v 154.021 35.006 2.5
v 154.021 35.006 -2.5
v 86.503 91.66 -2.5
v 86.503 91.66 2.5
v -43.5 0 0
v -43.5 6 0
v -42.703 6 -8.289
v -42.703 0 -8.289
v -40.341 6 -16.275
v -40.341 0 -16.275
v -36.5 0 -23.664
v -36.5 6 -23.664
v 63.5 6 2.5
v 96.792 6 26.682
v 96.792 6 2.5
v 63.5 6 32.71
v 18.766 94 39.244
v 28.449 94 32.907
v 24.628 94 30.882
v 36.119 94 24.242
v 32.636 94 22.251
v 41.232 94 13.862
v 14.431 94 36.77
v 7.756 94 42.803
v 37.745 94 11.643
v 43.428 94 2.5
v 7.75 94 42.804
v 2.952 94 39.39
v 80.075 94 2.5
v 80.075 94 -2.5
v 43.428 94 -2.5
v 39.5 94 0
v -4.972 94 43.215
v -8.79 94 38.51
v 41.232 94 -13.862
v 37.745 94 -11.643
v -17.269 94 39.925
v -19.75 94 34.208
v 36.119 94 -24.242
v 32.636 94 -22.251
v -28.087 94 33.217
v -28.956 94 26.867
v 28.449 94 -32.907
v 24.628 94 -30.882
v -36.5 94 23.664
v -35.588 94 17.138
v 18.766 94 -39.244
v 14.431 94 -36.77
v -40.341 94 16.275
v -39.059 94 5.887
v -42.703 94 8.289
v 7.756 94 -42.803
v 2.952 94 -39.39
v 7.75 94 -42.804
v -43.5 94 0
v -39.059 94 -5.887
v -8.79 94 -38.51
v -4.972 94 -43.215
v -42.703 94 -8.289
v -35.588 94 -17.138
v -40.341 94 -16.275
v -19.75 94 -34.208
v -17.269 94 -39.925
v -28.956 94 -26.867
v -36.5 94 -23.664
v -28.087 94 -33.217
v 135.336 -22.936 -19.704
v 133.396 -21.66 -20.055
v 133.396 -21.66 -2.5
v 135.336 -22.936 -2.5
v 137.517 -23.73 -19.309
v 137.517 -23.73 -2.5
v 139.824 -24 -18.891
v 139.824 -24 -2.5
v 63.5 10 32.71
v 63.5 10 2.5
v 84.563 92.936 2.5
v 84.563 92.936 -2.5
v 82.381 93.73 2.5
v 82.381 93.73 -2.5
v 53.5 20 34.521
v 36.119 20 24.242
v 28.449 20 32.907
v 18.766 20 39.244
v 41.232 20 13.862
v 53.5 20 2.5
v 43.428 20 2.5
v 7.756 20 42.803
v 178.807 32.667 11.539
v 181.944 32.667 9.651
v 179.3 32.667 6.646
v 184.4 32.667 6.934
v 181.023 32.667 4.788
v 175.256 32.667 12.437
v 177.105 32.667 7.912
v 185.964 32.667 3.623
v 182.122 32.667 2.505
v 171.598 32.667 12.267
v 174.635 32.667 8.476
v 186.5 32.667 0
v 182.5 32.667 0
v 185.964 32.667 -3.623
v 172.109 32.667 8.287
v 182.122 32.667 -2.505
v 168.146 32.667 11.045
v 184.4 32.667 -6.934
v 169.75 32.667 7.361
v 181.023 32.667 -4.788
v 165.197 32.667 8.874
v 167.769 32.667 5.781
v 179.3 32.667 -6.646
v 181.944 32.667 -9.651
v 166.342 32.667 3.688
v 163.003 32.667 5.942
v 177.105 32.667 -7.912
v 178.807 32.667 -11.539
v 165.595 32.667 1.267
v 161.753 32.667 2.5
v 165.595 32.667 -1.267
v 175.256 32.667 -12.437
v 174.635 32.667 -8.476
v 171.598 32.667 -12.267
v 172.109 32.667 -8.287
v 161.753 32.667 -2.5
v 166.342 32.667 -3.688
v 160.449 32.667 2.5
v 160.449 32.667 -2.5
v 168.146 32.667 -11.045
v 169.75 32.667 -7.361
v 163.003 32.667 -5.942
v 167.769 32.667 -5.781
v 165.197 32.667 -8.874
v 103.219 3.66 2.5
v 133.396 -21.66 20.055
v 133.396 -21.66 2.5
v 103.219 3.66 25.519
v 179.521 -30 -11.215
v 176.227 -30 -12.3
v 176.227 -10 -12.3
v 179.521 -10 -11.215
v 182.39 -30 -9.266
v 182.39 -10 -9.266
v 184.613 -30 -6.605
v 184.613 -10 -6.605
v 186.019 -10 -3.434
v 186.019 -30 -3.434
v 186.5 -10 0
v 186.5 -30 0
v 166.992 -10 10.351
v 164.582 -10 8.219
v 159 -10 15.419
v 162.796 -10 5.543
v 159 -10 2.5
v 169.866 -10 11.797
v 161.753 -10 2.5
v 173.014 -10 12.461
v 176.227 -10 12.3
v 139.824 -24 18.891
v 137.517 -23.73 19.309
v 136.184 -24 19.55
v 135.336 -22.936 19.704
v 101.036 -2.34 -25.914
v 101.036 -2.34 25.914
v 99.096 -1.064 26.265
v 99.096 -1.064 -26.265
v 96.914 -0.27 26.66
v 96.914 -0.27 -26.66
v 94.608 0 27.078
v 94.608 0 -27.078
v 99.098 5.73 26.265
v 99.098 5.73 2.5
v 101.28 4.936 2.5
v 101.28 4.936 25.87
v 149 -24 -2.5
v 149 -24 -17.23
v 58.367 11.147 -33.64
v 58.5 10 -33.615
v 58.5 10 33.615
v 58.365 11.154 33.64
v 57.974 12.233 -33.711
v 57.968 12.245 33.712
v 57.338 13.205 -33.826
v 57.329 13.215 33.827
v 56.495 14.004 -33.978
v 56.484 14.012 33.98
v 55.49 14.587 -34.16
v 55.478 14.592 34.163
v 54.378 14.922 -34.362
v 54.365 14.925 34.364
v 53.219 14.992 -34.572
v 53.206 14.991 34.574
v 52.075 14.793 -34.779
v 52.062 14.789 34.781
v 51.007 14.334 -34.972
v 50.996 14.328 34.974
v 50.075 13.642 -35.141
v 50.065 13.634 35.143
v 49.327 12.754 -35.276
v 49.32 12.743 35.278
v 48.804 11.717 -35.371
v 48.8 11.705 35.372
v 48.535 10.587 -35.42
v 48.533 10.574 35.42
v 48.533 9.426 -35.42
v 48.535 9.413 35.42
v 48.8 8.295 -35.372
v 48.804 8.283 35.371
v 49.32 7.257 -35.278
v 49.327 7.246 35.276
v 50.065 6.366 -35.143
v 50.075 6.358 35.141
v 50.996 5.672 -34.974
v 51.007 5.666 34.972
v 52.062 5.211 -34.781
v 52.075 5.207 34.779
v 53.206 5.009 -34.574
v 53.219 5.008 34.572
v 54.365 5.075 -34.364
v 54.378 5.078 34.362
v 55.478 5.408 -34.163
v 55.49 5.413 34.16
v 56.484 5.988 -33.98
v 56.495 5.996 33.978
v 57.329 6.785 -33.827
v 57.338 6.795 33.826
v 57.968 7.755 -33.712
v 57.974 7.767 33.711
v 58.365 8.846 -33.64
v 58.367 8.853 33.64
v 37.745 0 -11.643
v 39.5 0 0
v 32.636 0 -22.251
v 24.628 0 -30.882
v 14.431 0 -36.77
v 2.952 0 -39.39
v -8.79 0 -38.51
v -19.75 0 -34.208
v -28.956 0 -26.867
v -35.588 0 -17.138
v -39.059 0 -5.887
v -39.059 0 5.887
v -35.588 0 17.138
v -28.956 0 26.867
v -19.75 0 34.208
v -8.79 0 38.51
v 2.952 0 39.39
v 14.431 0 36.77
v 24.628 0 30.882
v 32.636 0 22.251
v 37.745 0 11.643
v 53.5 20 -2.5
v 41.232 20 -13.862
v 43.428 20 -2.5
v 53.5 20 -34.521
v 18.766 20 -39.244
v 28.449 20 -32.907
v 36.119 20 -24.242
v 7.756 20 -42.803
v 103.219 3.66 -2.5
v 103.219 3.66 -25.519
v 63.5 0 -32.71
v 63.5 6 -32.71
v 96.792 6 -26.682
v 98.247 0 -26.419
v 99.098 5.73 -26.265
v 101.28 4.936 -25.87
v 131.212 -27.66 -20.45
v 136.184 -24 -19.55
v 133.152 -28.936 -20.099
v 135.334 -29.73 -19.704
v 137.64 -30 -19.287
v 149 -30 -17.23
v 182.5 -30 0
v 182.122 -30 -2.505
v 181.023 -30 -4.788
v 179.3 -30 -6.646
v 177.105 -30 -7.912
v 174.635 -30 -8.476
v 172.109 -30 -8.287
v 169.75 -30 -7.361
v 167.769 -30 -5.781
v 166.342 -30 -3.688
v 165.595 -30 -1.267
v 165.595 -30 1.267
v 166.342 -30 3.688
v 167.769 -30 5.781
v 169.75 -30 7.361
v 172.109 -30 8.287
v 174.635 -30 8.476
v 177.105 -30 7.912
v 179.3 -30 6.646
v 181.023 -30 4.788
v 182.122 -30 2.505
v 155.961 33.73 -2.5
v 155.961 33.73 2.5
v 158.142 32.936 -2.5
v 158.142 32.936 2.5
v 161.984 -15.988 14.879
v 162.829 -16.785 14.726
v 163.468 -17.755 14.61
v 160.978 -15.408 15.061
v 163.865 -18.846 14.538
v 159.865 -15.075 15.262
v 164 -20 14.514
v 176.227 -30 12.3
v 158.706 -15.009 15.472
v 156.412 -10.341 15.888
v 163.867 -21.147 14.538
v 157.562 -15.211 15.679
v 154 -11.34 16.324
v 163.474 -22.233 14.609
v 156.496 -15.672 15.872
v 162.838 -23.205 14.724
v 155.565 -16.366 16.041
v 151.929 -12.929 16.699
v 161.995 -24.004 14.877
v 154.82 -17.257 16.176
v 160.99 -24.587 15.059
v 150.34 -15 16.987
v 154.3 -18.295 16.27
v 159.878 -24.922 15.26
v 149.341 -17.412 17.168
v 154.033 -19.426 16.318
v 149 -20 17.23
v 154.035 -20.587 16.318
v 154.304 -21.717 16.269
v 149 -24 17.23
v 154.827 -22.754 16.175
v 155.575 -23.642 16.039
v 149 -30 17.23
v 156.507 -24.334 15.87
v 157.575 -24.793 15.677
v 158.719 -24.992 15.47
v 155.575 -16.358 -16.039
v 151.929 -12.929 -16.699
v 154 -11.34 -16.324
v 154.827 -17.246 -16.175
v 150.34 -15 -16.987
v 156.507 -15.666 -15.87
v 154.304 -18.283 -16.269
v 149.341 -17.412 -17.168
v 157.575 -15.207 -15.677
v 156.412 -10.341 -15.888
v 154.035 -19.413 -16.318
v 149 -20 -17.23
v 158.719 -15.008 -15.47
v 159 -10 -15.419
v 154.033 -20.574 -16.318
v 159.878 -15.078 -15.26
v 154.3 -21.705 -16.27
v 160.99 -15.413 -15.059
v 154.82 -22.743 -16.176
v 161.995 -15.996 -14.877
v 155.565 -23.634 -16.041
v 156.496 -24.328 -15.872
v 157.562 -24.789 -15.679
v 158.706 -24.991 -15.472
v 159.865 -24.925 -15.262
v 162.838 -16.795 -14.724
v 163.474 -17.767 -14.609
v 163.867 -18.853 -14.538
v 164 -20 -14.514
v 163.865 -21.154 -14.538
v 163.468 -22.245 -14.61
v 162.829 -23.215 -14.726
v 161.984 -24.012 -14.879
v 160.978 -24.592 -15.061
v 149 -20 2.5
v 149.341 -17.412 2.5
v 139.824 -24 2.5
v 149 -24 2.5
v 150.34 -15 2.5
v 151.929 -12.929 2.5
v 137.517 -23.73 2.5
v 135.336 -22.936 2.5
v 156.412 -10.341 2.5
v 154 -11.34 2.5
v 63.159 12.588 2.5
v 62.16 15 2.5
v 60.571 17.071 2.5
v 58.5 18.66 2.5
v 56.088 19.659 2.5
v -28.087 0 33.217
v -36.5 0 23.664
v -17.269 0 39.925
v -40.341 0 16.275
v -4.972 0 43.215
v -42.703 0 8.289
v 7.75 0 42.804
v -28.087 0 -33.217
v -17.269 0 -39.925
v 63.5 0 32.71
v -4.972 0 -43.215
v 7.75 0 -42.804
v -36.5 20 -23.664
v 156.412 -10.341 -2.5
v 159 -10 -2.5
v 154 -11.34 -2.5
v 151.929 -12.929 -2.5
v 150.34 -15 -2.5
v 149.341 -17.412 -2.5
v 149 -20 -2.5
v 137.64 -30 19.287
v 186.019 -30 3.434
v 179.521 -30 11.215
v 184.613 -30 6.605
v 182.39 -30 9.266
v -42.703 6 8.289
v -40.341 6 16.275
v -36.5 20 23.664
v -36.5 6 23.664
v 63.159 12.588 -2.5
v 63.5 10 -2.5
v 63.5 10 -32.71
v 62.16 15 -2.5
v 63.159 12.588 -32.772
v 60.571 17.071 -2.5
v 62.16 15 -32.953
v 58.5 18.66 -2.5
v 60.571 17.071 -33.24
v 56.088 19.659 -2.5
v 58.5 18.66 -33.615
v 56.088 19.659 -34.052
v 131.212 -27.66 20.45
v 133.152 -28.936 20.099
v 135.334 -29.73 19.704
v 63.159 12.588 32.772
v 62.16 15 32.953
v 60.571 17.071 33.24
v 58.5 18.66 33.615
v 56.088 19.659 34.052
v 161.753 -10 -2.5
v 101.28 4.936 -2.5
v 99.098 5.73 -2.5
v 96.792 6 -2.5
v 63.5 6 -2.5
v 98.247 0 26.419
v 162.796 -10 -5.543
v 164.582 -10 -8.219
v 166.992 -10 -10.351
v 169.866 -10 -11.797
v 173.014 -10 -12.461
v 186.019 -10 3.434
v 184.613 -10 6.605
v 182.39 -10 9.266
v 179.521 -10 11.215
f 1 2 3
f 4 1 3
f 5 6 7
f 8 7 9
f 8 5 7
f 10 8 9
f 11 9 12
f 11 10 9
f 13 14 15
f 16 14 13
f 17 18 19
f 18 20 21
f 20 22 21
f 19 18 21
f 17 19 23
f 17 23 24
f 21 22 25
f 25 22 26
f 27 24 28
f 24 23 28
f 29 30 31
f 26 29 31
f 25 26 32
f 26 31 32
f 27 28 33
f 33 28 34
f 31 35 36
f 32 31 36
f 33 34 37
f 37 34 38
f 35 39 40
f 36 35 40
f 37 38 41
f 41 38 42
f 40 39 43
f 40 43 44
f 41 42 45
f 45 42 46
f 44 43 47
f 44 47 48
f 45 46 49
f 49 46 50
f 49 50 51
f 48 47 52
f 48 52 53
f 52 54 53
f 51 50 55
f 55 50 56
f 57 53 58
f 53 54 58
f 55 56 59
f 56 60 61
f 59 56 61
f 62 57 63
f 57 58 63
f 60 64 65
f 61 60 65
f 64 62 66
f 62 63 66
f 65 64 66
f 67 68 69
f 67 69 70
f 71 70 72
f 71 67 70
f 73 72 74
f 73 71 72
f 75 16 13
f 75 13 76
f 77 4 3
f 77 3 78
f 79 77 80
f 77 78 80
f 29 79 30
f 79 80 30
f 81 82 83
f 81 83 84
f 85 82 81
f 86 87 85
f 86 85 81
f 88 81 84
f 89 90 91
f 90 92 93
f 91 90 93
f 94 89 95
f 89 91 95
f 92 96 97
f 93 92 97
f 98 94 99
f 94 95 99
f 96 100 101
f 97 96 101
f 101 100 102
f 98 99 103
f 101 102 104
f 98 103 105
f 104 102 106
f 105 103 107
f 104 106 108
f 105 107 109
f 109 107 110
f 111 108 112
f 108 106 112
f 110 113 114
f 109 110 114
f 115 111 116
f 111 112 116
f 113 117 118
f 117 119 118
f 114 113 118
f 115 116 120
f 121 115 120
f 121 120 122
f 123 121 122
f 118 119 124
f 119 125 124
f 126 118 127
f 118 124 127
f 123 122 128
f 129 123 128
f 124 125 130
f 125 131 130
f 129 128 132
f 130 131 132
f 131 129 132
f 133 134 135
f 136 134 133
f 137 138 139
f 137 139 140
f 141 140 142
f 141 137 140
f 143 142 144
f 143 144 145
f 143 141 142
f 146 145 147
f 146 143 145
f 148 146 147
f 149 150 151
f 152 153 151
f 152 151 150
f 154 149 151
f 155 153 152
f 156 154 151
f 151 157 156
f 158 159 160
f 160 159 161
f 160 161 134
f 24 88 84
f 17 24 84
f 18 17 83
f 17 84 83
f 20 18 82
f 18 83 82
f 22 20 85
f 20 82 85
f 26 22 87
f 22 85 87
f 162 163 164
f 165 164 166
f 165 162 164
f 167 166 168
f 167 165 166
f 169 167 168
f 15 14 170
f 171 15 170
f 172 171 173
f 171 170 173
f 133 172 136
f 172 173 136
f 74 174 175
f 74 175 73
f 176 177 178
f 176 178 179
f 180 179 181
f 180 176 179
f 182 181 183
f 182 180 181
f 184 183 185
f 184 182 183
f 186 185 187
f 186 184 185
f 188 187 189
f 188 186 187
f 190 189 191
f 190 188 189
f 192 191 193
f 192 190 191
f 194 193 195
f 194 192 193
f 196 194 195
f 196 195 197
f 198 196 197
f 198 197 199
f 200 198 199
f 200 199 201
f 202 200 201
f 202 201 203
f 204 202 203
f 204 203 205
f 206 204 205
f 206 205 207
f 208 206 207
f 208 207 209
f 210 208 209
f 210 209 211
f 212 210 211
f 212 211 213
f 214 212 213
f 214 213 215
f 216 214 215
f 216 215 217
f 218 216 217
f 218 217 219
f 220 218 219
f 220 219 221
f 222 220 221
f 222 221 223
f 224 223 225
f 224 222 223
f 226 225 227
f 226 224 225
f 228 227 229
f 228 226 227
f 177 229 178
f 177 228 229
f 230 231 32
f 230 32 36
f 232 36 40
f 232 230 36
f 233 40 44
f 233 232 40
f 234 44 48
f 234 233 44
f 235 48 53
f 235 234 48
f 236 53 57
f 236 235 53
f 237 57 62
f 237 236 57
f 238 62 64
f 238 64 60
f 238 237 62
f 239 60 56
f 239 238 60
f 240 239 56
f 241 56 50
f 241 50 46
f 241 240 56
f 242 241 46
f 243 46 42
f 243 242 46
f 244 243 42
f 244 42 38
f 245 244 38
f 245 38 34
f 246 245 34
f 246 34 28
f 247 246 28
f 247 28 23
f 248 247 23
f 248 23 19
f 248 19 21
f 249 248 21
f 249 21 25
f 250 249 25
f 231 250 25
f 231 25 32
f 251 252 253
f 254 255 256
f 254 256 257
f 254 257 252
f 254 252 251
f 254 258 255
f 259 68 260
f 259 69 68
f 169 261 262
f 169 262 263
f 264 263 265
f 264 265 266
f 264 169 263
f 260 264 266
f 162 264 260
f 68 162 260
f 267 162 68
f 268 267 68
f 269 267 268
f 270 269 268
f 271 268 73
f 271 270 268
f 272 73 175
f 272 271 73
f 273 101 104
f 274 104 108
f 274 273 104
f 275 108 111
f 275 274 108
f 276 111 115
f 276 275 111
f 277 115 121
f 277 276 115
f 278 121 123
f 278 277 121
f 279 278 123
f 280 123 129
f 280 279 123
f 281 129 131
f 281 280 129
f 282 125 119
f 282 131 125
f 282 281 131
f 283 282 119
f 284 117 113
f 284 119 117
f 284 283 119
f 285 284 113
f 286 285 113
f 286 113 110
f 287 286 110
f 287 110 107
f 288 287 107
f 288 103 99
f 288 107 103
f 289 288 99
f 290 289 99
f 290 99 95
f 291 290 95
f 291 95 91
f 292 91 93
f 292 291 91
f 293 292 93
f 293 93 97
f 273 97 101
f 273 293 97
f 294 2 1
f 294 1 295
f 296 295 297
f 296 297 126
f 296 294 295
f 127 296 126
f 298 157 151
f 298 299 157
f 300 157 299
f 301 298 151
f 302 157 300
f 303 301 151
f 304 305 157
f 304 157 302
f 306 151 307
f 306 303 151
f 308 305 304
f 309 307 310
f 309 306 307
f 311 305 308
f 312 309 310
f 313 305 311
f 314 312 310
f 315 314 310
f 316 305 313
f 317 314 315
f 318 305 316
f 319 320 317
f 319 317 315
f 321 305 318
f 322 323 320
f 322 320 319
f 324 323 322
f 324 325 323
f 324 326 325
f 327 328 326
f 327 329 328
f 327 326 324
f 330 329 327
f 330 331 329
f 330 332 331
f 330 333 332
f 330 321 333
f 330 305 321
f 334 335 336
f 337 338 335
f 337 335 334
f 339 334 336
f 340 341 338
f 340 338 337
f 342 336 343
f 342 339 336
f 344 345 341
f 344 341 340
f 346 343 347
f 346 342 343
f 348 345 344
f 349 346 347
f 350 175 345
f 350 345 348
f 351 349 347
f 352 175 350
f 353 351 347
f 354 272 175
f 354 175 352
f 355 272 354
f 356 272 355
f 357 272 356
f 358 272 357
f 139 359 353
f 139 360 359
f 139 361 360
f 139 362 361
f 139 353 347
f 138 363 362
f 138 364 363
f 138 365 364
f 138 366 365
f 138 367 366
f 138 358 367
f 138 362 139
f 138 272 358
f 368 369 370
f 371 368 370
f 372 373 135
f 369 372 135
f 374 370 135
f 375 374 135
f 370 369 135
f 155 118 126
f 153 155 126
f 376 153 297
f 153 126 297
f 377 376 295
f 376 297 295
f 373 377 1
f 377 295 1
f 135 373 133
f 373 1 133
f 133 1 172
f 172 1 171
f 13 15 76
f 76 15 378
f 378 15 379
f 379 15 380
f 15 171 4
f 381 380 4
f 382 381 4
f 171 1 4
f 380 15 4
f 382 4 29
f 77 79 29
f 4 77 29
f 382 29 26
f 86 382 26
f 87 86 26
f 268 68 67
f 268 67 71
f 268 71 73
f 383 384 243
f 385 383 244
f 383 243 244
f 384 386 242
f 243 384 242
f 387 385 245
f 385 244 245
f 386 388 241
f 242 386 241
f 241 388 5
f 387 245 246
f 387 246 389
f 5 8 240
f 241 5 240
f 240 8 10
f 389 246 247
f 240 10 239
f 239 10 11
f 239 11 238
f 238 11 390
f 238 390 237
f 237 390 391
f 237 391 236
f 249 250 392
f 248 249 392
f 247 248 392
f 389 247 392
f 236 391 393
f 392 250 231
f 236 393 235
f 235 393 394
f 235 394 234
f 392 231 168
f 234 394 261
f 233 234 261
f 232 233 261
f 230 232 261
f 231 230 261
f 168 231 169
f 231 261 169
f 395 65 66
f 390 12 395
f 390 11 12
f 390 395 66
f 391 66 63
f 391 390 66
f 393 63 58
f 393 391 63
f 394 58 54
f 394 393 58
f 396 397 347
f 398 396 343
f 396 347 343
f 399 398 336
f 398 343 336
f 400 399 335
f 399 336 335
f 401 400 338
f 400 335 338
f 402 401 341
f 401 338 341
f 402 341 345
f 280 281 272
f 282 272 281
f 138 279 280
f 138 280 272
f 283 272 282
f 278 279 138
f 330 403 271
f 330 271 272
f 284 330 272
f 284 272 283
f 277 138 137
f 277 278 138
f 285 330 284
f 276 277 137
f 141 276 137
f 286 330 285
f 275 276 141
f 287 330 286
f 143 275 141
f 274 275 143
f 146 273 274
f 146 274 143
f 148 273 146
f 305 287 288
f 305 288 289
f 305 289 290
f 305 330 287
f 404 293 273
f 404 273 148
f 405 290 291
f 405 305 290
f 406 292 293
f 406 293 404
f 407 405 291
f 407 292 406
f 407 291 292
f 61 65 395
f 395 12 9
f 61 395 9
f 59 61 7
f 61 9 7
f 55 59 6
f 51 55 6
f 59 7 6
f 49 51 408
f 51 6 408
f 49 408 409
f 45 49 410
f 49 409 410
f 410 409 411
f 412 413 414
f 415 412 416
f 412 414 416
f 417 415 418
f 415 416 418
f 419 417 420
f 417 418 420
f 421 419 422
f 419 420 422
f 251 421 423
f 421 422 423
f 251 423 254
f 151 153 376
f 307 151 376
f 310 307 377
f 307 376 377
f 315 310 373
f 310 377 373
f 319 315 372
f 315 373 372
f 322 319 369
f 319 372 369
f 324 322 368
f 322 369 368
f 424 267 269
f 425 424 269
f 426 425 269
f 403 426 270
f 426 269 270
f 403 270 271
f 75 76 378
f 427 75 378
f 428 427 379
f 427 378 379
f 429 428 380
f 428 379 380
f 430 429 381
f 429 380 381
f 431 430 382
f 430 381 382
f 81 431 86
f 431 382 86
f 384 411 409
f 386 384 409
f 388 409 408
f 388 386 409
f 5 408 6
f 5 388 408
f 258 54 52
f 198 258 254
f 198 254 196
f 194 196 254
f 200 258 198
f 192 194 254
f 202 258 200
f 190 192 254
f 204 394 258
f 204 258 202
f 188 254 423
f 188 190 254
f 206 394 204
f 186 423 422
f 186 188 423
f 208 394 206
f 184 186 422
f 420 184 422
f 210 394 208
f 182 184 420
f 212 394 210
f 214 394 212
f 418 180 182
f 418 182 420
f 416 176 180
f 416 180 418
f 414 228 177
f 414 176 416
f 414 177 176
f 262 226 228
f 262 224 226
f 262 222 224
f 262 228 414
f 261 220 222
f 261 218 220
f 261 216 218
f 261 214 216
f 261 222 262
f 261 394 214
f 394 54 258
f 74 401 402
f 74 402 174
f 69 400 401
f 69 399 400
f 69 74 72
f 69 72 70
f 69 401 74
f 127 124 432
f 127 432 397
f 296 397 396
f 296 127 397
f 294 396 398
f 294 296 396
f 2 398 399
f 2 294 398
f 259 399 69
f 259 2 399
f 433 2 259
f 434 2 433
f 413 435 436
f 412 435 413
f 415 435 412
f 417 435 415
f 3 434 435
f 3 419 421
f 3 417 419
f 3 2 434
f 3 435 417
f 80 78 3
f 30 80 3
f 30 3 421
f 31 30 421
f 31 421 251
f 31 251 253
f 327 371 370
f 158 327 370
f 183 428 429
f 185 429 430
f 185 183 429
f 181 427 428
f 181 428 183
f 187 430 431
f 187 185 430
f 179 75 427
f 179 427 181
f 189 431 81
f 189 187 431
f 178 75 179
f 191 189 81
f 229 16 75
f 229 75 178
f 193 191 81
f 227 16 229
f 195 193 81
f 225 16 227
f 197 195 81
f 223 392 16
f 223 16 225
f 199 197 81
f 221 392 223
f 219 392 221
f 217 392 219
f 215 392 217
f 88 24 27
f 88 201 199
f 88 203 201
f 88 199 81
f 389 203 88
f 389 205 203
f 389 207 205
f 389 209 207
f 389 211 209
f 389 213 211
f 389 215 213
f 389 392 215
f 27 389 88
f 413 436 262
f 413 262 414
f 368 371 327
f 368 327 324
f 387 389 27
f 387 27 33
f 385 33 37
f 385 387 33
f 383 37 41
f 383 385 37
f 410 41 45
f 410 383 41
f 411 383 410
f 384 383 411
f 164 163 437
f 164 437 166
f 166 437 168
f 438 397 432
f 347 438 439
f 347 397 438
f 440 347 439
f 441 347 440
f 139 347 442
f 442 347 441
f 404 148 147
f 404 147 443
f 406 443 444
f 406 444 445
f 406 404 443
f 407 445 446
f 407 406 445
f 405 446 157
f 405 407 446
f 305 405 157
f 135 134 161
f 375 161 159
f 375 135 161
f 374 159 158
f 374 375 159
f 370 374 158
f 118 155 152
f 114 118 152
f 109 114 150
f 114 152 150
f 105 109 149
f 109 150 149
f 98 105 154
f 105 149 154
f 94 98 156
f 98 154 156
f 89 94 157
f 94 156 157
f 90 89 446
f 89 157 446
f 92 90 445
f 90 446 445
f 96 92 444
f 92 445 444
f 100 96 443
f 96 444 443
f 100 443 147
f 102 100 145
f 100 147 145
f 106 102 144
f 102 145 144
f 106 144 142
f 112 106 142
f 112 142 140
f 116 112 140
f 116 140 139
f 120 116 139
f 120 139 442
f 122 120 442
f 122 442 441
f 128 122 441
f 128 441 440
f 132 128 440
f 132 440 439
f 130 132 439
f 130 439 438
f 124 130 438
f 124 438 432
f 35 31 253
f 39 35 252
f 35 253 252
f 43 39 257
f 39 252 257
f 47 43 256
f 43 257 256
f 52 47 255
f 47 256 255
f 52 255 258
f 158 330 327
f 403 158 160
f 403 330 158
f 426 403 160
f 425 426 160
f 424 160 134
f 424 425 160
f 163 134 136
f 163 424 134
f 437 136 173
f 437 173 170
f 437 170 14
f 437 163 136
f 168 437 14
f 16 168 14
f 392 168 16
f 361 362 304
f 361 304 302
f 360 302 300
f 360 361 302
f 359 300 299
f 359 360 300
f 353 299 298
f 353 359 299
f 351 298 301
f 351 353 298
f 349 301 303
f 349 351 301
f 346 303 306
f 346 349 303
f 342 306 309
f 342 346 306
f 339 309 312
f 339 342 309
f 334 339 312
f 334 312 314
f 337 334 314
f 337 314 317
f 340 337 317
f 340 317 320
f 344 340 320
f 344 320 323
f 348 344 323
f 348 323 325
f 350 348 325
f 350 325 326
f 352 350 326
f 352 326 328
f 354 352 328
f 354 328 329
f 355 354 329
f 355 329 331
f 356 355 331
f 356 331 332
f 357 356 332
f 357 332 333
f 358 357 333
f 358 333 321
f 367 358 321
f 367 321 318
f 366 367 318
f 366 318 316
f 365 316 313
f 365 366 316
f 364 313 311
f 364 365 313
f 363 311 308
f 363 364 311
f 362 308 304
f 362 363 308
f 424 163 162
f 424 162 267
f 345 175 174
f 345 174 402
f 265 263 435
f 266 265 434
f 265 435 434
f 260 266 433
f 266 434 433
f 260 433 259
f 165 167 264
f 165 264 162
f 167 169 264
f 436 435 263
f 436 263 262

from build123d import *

# Parameters (mm, degrees)
SKETCH2_R                = 43.5
BOSS_EXTRUDE1_DEPTH      = 94
BOSS_EXTRUDE2_START      = -30
SKETCH2_3_R              = 12.5
BOSS_EXTRUDE2_DEPTH      = 62.666667
EXTRUDE_THIN1_DEPTH      = 115
BOSS_EXTRUDE3_START      = -230
SKETCH5_W                = 100
SKETCH5_H                = 20
SKETCH5_W_2              = 50
BOSS_EXTRUDE3_DEPTH      = 230
CUT_EXTRUDE2_DEPTH       = 319.334729
CUT_EXTRUDE2_DEPTH_BACK  = 319.334729
SKETCH5_3_R              = 5
CUT_EXTRUDE1_START       = -30
CUT_EXTRUDE1_OUTLINE_R   = 8.5
CUT_EXTRUDE1_OUTLINE_R_2 = 39.5
CUT_EXTRUDE1_DEPTH       = 124
RIB1_START               = -2.5
RIB1_DEPTH               = 5
FILLET1_R                = 10


# Read off the part's stored shape, not the designer's step: Cut-Extrude1, Rib1
with BuildPart() as part:
    # Sketch2 → Boss-Extrude1 (new body)
    with BuildSketch(Plane(origin=(0, 0, 0), x_dir=(1, 0, 0), z_dir=(0, 1, 0))):
        with Locations(Location((0, 0, 0), (0, 0, 270))):
            Circle(SKETCH2_R)
    extrude(amount=BOSS_EXTRUDE1_DEPTH)



with BuildPart() as body_2:
    # Sketch2<3> → Boss-Extrude2 (new body)
    with BuildSketch(Plane(origin=(0, 0, 0), x_dir=(1, 0, 0), z_dir=(0, 1, 0)).offset(BOSS_EXTRUDE2_START)):
        with Locations(Location((174, 0, 0), (0, 0, 270))):
            Circle(SKETCH2_3_R)
    extrude(amount=BOSS_EXTRUDE2_DEPTH)


with BuildPart() as part_1:
    add(part.part)

    add(body_2.part)  # Extrude-Thin1 merges body 2
    # Sketch3 → Extrude-Thin1 (add, symmetric)
    with BuildSketch(Plane.XY):
        Polygon((-43.5, 0), (98.247392, 0), (134, -30), (186.5, -30), (186.5, -24), (136.183821, -24), (100.431214, 6), (-43.5, 6), align=None)
    extrude(amount=EXTRUDE_THIN1_DEPTH, both=True)

    # Sketch5 → Boss-Extrude3 (add)
    with BuildSketch(Plane.XY.offset(115).offset(BOSS_EXTRUDE3_START)):
        with Locations((13.5, 10)):
            Rectangle(SKETCH5_W, SKETCH5_H)
        with Locations((174, -20)):
            Rectangle(SKETCH5_W_2, SKETCH5_H)
    extrude(amount=BOSS_EXTRUDE3_DEPTH)

    # Sketch5<3> → Cut-Extrude2 (cut, two sides: drawn at the far end of the back side and taken through both)
    with BuildSketch(Plane.XY.offset(115).offset(-CUT_EXTRUDE2_DEPTH_BACK)):
        with Locations((53.5, 10)):
            Circle(SKETCH5_3_R)
        with Locations((159, -20)):
            Circle(SKETCH5_3_R)
    extrude(amount=CUT_EXTRUDE2_DEPTH + CUT_EXTRUDE2_DEPTH_BACK, mode=Mode.SUBTRACT)

    # Cut-Extrude1 outline → Cut-Extrude1 (cut)
    with BuildSketch(Plane(origin=(0, 0, 0), x_dir=(1, 0, 0), z_dir=(0, 1, 0)).offset(CUT_EXTRUDE1_START)):
        with Locations((174, 0)):
            Circle(CUT_EXTRUDE1_OUTLINE_R)
        with BuildLine():
            ThreePointArc((-36.5, 23.664319), (-17.269135, 39.925267), (7.75, 42.804059))
            Line((7.75, 42.804059), (63.5, 32.710099))
            Line((63.5, 32.710099), (63.5, 115))
            Line((63.5, 115), (-36.5, 115))
            Line((-36.5, 115), (-36.5, 23.664319))
        make_face()
        with BuildLine():
            Line((63.5, -32.710099), (7.75, -42.804059))
            ThreePointArc((7.75, -42.804059), (-17.269135, -39.925267), (-36.5, -23.664319))
            Line((-36.5, -23.664319), (-36.5, -115))
            Line((-36.5, -115), (63.5, -115))
            Line((63.5, -115), (63.5, -32.710099))
        make_face()
        with BuildLine():
            ThreePointArc((-43.5, 0), (-41.713307, 12.338963), (-36.5, 23.664319))
            Line((-36.5, 23.664319), (-36.5, 115))
            Line((-36.5, 115), (-43.5, 115))
            Line((-43.5, 115), (-43.5, 0))
        make_face()
        Polygon((63.5, 115), (63.5, 32.710099), (149, 17.229674), (149, 115), align=None)
        with BuildLine():
            Line((-36.5, -115), (-36.5, -23.664319))
            ThreePointArc((-36.5, -23.664319), (-41.713307, -12.338963), (-43.5, 0))
            Line((-43.5, 0), (-43.5, -115))
            Line((-43.5, -115), (-36.5, -115))
        make_face()
        Polygon((149, -17.229674), (63.5, -32.710099), (63.5, -115), (149, -115), align=None)
        with BuildLine():
            Line((149, 115), (149, 17.229674))
            Line((149, 17.229674), (176.227011, 12.300017))
            ThreePointArc((176.227011, 12.300017), (183.593947, 8.012876), (186.5, 0))
            ThreePointArc((186.5, 0), (183.593947, -8.012876), (176.227011, -12.300017))
            Line((176.227011, -12.300017), (149, -17.229674))
            Line((149, -17.229674), (149, -115))
            Line((149, -115), (199, -115))
            Line((199, -115), (199, 115))
            Line((199, 115), (149, 115))
        make_face()
        Circle(CUT_EXTRUDE1_OUTLINE_R_2)
    extrude(amount=CUT_EXTRUDE1_DEPTH, mode=Mode.SUBTRACT)

    # Rib1 outline → Rib1 (add)
    with BuildSketch(Plane.XY.offset(RIB1_START)):
        Polygon((156.808801, 32.666667), (83.714581, 94), (42, 94), (42, 20), (63.5, 20), (63.5, 6), (100.431214, 6), (136.183821, -24), (149, -24), (149, -10), (163, -10), (163, 32.666667), align=None)
    extrude(amount=RIB1_DEPTH)

    # Fillet1
    # the kernel refuses this fillet: 10 mm, written as the material it adds along each edge
    with BuildSketch(Plane(origin=(98.247392, 0, -35.518075), x_dir=(-1, 0, 0), z_dir=(0, 0, 1))) as fillet1_piece_1_section:
        with BuildLine():
            CenterArc((FILLET1_R * 0.363970234266, FILLET1_R), FILLET1_R, 230, 40)
            Line((-FILLET1_R * 0.27881737542, FILLET1_R * 0.233955556881), (0, 0))
            Line((0, 0), (FILLET1_R * 0.363970234266, 0))
        make_face()
    fillet1_piece_1 = extrude(amount=71.03615, mode=Mode.PRIVATE)
    fillet1_piece_1 = split(fillet1_piece_1, bisect_by=Plane(origin=(102.693133, -0.478631, -25.613884), z_dir=(-0.17816091954075147, 0, 0.9840013652167328)), keep=Keep.TOP, mode=Mode.PRIVATE)
    fillet1_piece_1 = split(fillet1_piece_1, bisect_by=Plane(origin=(102.693133, -0.478631, 25.613884), z_dir=(-0.17816091954075147, 0, -0.9840013652167328)), keep=Keep.TOP, mode=Mode.PRIVATE)
    add(fillet1_piece_1)
    with BuildSketch(Plane(origin=(136.183821, -24, -6.599256), x_dir=(-0.7660444431189806, 0.6427876096865363, 0), z_dir=(0, 0, 1))) as fillet1_piece_2_section:
        with BuildLine():
            CenterArc((FILLET1_R * 0.363970234266, -FILLET1_R), FILLET1_R, 90, 40)
            Line((-FILLET1_R * 0.27881737542, -FILLET1_R * 0.233955556881), (0, 0))
            Line((0, 0), (FILLET1_R * 0.363970234266, 0))
        make_face()
    fillet1_piece_2 = extrude(amount=35.248652, mode=Mode.PRIVATE)
    fillet1_piece_2 = split(fillet1_piece_2, bisect_by=Plane(origin=(140.141098, -23.515892, 18.833646), z_dir=(-0.17816091954075147, 0, -0.9840013652167328)), keep=Keep.TOP, mode=Mode.PRIVATE)
    add(fillet1_piece_2)
    with BuildSketch(Plane(origin=(136.183821, -24, -28.649397), x_dir=(1, 0, 0), z_dir=(0, 0, 1))) as fillet1_piece_3_section:
        with BuildLine():
            CenterArc((FILLET1_R * 0.363970234266, FILLET1_R), FILLET1_R, 230, 40)
            Line((-FILLET1_R * 0.27881737542, FILLET1_R * 0.233955556881), (0, 0))
            Line((0, 0), (FILLET1_R * 0.363970234266, 0))
        make_face()
    fillet1_piece_3 = extrude(amount=35.248652, mode=Mode.PRIVATE)
    fillet1_piece_3 = split(fillet1_piece_3, bisect_by=Plane(origin=(137.827829, -23.50738, -19.252481), z_dir=(-0.17816091954075147, 0, 0.9840013652167328)), keep=Keep.TOP, mode=Mode.PRIVATE)
    add(fillet1_piece_3)
    with BuildSketch(Plane(origin=(156.808801, 32.666667, -2.5), x_dir=(1, 0, 0), z_dir=(0, 0, 1))) as fillet1_piece_4:
        with BuildLine():
            CenterArc((FILLET1_R * 0.363970234268, FILLET1_R), FILLET1_R, 230, 40)
            Line((-FILLET1_R * 0.278817375421, FILLET1_R * 0.233955556883), (0, 0))
            Line((0, 0), (FILLET1_R * 0.363970234268, 0))
        make_face()
    extrude(amount=5)
    # the kernel refuses this fillet: 10 mm, written as the material it takes off along each edge
    with BuildSketch(Plane(origin=(100.431214, 6, 35.122678), x_dir=(-1, 0, 0), z_dir=(0, 0, -1))) as fillet1_2_piece_1:
        with BuildLine():
            CenterArc((FILLET1_R * 0.363970234266, -FILLET1_R), FILLET1_R, 90, 40)
            Line((-FILLET1_R * 0.27881737542, -FILLET1_R * 0.233955556881), (0, 0))
            Line((0, 0), (FILLET1_R * 0.363970234266, 0))
        make_face()
    extrude(amount=32.622678, mode=Mode.SUBTRACT)
    with BuildSketch(Plane(origin=(100.431214, 6, 35.122678), x_dir=(-1, 0, 0), z_dir=(0, 0, -1))) as fillet1_2_piece_2_section:
        with BuildLine():
            CenterArc((FILLET1_R * 0.363970234266, -FILLET1_R), FILLET1_R, 90, 40)
            Line((-FILLET1_R * 0.27881737542, -FILLET1_R * 0.233955556881), (0, 0))
            Line((0, 0), (FILLET1_R * 0.363970234266, 0))
        make_face()
    fillet1_2_piece_2 = extrude(amount=41.721934, mode=Mode.PRIVATE)
    fillet1_2_piece_2 = split(fillet1_2_piece_2, bisect_by=Plane(origin=(100.255013, 5.515892, -2.5), z_dir=(0, 0, -1)), keep=Keep.TOP, mode=Mode.PRIVATE)
    add(fillet1_2_piece_2, mode=Mode.SUBTRACT)
    with BuildSketch(Plane(origin=(134, -30, -29.044794), x_dir=(-0.766044443118982, 0.6427876096865346, 0), z_dir=(0, 0, 1))) as fillet1_2_piece_3:
        with BuildLine():
            CenterArc((FILLET1_R * 0.363970234266, -FILLET1_R), FILLET1_R, 90, 40)
            Line((-FILLET1_R * 0.27881737542, -FILLET1_R * 0.233955556881), (0, 0))
            Line((0, 0), (FILLET1_R * 0.363970234266, 0))
        make_face()
    extrude(amount=58.089588, mode=Mode.SUBTRACT)
    with BuildSketch(Plane(origin=(149, -10, -22.5), x_dir=(0, -1, 0), z_dir=(0, 0, 1))) as fillet1_2_piece_4_section:
        with BuildLine():
            CenterArc((FILLET1_R, FILLET1_R), FILLET1_R, 180, 90)
            Line((0, FILLET1_R), (0, 0))
            Line((0, 0), (FILLET1_R, 0))
        make_face()
    fillet1_2_piece_4 = extrude(amount=64.729674, mode=Mode.PRIVATE)
    fillet1_2_piece_4 = split(fillet1_2_piece_4, bisect_by=Plane(origin=(151.263951, -12.263951, -2.5), z_dir=(0, 0, -1)), keep=Keep.TOP, mode=Mode.PRIVATE)
    add(fillet1_2_piece_4, mode=Mode.SUBTRACT)
    with BuildSketch(Plane(origin=(149, -10, 2.5), x_dir=(0, -1, 0), z_dir=(0, 0, 1))) as fillet1_2_piece_5:
        with BuildLine():
            CenterArc((FILLET1_R, FILLET1_R), FILLET1_R, 180, 90)
            Line((0, FILLET1_R), (0, 0))
            Line((0, 0), (FILLET1_R, 0))
        make_face()
    extrude(amount=39.729674, mode=Mode.SUBTRACT)
    with BuildSketch(Plane(origin=(100.431214, 6, 6.599256), x_dir=(0.7660444431189812, -0.6427876096865356, 0), z_dir=(0, 0, -1))) as fillet1_2_piece_6_section:
        with BuildLine():
            CenterArc((FILLET1_R * 0.363970234266, FILLET1_R), FILLET1_R, 230, 40)
            Line((-FILLET1_R * 0.27881737542, FILLET1_R * 0.233955556881), (0, 0))
            Line((0, 0), (FILLET1_R * 0.363970234266, 0))
        make_face()
    fillet1_2_piece_6 = extrude(amount=41.721934, mode=Mode.PRIVATE)
    fillet1_2_piece_6 = split(fillet1_2_piece_6, bisect_by=Plane(origin=(100.255013, 5.515892, 2.5), z_dir=(0, 0, 1)), keep=Keep.TOP, mode=Mode.PRIVATE)
    add(fillet1_2_piece_6, mode=Mode.SUBTRACT)
    with BuildSketch(Plane(origin=(100.431214, 6, -2.5), x_dir=(0.7660444431189812, -0.6427876096865356, 0), z_dir=(0, 0, -1))) as fillet1_2_piece_7:
        with BuildLine():
            CenterArc((FILLET1_R * 0.363970234266, FILLET1_R), FILLET1_R, 230, 40)
            Line((-FILLET1_R * 0.27881737542, FILLET1_R * 0.233955556881), (0, 0))
            Line((0, 0), (FILLET1_R * 0.363970234266, 0))
        make_face()
    extrude(amount=32.622678, mode=Mode.SUBTRACT)
    with BuildSketch(Plane(origin=(63.5, 20, -22.5), x_dir=(-1, 0, 0), z_dir=(0, 0, 1))) as fillet1_2_piece_8_section:
        with BuildLine():
            CenterArc((FILLET1_R, FILLET1_R), FILLET1_R, 180, 90)
            Line((0, FILLET1_R), (0, 0))
            Line((0, 0), (FILLET1_R, 0))
        make_face()
    fillet1_2_piece_8 = extrude(amount=80.210099, mode=Mode.PRIVATE)
    fillet1_2_piece_8 = split(fillet1_2_piece_8, bisect_by=Plane(origin=(61.236049, 17.736049, -2.5), z_dir=(0, 0, -1)), keep=Keep.TOP, mode=Mode.PRIVATE)
    add(fillet1_2_piece_8, mode=Mode.SUBTRACT)
    with BuildSketch(Plane(origin=(63.5, 20, 2.5), x_dir=(-1, 0, 0), z_dir=(0, 0, 1))) as fillet1_2_piece_9:
        with BuildLine():
            CenterArc((FILLET1_R, FILLET1_R), FILLET1_R, 180, 90)
            Line((0, FILLET1_R), (0, 0))
            Line((0, 0), (FILLET1_R, 0))
        make_face()
    extrude(amount=55.210099, mode=Mode.SUBTRACT)
    with BuildSketch(Plane(origin=(83.714581, 94, -11.599256), x_dir=(-1, 0, 0), z_dir=(0, 0, 1))) as fillet1_2_piece_10:
        with BuildLine():
            CenterArc((FILLET1_R * 0.363970234268, FILLET1_R), FILLET1_R, 230, 40)
            Line((-FILLET1_R * 0.278817375421, FILLET1_R * 0.233955556883), (0, 0))
            Line((0, 0), (FILLET1_R * 0.363970234268, 0))
        make_face()
    extrude(amount=23.198512, mode=Mode.SUBTRACT)
    with BuildSketch(Plane(origin=(149, -10, -42.229674), x_dir=(1, 0, 0), z_dir=(0, 0, 1))) as fillet1_2_piece_11:
        with BuildLine():
            CenterArc((FILLET1_R, -FILLET1_R), FILLET1_R, 90, 90)
            Line((0, -FILLET1_R), (0, 0))
            Line((0, 0), (FILLET1_R, 0))
        make_face()
    extrude(amount=39.729674, mode=Mode.SUBTRACT)
    with BuildSketch(Plane(origin=(149, -10, -42.229674), x_dir=(1, 0, 0), z_dir=(0, 0, 1))) as fillet1_2_piece_12_section:
        with BuildLine():
            CenterArc((FILLET1_R, -FILLET1_R), FILLET1_R, 90, 90)
            Line((0, -FILLET1_R), (0, 0))
            Line((0, 0), (FILLET1_R, 0))
        make_face()
    fillet1_2_piece_12 = extrude(amount=64.729674, mode=Mode.PRIVATE)
    fillet1_2_piece_12 = split(fillet1_2_piece_12, bisect_by=Plane(origin=(151.263951, -12.263951, 2.5), z_dir=(0, 0, 1)), keep=Keep.TOP, mode=Mode.PRIVATE)
    add(fillet1_2_piece_12, mode=Mode.SUBTRACT)
    with BuildSketch(Plane(origin=(63.5, 20, -57.710099), x_dir=(0, -1, 0), z_dir=(0, 0, 1))) as fillet1_2_piece_13:
        with BuildLine():
            CenterArc((FILLET1_R, -FILLET1_R), FILLET1_R, 90, 90)
            Line((0, -FILLET1_R), (0, 0))
            Line((0, 0), (FILLET1_R, 0))
        make_face()
    extrude(amount=55.210099, mode=Mode.SUBTRACT)
    with BuildSketch(Plane(origin=(63.5, 20, -57.710099), x_dir=(0, -1, 0), z_dir=(0, 0, 1))) as fillet1_2_piece_14_section:
        with BuildLine():
            CenterArc((FILLET1_R, -FILLET1_R), FILLET1_R, 90, 90)
            Line((0, -FILLET1_R), (0, 0))
            Line((0, 0), (FILLET1_R, 0))
        make_face()
    fillet1_2_piece_14 = extrude(amount=80.210099, mode=Mode.PRIVATE)
    fillet1_2_piece_14 = split(fillet1_2_piece_14, bisect_by=Plane(origin=(61.236049, 17.736049, 2.5), z_dir=(0, 0, 1)), keep=Keep.TOP, mode=Mode.PRIVATE)
    add(fillet1_2_piece_14, mode=Mode.SUBTRACT)


solid = part_1.part
